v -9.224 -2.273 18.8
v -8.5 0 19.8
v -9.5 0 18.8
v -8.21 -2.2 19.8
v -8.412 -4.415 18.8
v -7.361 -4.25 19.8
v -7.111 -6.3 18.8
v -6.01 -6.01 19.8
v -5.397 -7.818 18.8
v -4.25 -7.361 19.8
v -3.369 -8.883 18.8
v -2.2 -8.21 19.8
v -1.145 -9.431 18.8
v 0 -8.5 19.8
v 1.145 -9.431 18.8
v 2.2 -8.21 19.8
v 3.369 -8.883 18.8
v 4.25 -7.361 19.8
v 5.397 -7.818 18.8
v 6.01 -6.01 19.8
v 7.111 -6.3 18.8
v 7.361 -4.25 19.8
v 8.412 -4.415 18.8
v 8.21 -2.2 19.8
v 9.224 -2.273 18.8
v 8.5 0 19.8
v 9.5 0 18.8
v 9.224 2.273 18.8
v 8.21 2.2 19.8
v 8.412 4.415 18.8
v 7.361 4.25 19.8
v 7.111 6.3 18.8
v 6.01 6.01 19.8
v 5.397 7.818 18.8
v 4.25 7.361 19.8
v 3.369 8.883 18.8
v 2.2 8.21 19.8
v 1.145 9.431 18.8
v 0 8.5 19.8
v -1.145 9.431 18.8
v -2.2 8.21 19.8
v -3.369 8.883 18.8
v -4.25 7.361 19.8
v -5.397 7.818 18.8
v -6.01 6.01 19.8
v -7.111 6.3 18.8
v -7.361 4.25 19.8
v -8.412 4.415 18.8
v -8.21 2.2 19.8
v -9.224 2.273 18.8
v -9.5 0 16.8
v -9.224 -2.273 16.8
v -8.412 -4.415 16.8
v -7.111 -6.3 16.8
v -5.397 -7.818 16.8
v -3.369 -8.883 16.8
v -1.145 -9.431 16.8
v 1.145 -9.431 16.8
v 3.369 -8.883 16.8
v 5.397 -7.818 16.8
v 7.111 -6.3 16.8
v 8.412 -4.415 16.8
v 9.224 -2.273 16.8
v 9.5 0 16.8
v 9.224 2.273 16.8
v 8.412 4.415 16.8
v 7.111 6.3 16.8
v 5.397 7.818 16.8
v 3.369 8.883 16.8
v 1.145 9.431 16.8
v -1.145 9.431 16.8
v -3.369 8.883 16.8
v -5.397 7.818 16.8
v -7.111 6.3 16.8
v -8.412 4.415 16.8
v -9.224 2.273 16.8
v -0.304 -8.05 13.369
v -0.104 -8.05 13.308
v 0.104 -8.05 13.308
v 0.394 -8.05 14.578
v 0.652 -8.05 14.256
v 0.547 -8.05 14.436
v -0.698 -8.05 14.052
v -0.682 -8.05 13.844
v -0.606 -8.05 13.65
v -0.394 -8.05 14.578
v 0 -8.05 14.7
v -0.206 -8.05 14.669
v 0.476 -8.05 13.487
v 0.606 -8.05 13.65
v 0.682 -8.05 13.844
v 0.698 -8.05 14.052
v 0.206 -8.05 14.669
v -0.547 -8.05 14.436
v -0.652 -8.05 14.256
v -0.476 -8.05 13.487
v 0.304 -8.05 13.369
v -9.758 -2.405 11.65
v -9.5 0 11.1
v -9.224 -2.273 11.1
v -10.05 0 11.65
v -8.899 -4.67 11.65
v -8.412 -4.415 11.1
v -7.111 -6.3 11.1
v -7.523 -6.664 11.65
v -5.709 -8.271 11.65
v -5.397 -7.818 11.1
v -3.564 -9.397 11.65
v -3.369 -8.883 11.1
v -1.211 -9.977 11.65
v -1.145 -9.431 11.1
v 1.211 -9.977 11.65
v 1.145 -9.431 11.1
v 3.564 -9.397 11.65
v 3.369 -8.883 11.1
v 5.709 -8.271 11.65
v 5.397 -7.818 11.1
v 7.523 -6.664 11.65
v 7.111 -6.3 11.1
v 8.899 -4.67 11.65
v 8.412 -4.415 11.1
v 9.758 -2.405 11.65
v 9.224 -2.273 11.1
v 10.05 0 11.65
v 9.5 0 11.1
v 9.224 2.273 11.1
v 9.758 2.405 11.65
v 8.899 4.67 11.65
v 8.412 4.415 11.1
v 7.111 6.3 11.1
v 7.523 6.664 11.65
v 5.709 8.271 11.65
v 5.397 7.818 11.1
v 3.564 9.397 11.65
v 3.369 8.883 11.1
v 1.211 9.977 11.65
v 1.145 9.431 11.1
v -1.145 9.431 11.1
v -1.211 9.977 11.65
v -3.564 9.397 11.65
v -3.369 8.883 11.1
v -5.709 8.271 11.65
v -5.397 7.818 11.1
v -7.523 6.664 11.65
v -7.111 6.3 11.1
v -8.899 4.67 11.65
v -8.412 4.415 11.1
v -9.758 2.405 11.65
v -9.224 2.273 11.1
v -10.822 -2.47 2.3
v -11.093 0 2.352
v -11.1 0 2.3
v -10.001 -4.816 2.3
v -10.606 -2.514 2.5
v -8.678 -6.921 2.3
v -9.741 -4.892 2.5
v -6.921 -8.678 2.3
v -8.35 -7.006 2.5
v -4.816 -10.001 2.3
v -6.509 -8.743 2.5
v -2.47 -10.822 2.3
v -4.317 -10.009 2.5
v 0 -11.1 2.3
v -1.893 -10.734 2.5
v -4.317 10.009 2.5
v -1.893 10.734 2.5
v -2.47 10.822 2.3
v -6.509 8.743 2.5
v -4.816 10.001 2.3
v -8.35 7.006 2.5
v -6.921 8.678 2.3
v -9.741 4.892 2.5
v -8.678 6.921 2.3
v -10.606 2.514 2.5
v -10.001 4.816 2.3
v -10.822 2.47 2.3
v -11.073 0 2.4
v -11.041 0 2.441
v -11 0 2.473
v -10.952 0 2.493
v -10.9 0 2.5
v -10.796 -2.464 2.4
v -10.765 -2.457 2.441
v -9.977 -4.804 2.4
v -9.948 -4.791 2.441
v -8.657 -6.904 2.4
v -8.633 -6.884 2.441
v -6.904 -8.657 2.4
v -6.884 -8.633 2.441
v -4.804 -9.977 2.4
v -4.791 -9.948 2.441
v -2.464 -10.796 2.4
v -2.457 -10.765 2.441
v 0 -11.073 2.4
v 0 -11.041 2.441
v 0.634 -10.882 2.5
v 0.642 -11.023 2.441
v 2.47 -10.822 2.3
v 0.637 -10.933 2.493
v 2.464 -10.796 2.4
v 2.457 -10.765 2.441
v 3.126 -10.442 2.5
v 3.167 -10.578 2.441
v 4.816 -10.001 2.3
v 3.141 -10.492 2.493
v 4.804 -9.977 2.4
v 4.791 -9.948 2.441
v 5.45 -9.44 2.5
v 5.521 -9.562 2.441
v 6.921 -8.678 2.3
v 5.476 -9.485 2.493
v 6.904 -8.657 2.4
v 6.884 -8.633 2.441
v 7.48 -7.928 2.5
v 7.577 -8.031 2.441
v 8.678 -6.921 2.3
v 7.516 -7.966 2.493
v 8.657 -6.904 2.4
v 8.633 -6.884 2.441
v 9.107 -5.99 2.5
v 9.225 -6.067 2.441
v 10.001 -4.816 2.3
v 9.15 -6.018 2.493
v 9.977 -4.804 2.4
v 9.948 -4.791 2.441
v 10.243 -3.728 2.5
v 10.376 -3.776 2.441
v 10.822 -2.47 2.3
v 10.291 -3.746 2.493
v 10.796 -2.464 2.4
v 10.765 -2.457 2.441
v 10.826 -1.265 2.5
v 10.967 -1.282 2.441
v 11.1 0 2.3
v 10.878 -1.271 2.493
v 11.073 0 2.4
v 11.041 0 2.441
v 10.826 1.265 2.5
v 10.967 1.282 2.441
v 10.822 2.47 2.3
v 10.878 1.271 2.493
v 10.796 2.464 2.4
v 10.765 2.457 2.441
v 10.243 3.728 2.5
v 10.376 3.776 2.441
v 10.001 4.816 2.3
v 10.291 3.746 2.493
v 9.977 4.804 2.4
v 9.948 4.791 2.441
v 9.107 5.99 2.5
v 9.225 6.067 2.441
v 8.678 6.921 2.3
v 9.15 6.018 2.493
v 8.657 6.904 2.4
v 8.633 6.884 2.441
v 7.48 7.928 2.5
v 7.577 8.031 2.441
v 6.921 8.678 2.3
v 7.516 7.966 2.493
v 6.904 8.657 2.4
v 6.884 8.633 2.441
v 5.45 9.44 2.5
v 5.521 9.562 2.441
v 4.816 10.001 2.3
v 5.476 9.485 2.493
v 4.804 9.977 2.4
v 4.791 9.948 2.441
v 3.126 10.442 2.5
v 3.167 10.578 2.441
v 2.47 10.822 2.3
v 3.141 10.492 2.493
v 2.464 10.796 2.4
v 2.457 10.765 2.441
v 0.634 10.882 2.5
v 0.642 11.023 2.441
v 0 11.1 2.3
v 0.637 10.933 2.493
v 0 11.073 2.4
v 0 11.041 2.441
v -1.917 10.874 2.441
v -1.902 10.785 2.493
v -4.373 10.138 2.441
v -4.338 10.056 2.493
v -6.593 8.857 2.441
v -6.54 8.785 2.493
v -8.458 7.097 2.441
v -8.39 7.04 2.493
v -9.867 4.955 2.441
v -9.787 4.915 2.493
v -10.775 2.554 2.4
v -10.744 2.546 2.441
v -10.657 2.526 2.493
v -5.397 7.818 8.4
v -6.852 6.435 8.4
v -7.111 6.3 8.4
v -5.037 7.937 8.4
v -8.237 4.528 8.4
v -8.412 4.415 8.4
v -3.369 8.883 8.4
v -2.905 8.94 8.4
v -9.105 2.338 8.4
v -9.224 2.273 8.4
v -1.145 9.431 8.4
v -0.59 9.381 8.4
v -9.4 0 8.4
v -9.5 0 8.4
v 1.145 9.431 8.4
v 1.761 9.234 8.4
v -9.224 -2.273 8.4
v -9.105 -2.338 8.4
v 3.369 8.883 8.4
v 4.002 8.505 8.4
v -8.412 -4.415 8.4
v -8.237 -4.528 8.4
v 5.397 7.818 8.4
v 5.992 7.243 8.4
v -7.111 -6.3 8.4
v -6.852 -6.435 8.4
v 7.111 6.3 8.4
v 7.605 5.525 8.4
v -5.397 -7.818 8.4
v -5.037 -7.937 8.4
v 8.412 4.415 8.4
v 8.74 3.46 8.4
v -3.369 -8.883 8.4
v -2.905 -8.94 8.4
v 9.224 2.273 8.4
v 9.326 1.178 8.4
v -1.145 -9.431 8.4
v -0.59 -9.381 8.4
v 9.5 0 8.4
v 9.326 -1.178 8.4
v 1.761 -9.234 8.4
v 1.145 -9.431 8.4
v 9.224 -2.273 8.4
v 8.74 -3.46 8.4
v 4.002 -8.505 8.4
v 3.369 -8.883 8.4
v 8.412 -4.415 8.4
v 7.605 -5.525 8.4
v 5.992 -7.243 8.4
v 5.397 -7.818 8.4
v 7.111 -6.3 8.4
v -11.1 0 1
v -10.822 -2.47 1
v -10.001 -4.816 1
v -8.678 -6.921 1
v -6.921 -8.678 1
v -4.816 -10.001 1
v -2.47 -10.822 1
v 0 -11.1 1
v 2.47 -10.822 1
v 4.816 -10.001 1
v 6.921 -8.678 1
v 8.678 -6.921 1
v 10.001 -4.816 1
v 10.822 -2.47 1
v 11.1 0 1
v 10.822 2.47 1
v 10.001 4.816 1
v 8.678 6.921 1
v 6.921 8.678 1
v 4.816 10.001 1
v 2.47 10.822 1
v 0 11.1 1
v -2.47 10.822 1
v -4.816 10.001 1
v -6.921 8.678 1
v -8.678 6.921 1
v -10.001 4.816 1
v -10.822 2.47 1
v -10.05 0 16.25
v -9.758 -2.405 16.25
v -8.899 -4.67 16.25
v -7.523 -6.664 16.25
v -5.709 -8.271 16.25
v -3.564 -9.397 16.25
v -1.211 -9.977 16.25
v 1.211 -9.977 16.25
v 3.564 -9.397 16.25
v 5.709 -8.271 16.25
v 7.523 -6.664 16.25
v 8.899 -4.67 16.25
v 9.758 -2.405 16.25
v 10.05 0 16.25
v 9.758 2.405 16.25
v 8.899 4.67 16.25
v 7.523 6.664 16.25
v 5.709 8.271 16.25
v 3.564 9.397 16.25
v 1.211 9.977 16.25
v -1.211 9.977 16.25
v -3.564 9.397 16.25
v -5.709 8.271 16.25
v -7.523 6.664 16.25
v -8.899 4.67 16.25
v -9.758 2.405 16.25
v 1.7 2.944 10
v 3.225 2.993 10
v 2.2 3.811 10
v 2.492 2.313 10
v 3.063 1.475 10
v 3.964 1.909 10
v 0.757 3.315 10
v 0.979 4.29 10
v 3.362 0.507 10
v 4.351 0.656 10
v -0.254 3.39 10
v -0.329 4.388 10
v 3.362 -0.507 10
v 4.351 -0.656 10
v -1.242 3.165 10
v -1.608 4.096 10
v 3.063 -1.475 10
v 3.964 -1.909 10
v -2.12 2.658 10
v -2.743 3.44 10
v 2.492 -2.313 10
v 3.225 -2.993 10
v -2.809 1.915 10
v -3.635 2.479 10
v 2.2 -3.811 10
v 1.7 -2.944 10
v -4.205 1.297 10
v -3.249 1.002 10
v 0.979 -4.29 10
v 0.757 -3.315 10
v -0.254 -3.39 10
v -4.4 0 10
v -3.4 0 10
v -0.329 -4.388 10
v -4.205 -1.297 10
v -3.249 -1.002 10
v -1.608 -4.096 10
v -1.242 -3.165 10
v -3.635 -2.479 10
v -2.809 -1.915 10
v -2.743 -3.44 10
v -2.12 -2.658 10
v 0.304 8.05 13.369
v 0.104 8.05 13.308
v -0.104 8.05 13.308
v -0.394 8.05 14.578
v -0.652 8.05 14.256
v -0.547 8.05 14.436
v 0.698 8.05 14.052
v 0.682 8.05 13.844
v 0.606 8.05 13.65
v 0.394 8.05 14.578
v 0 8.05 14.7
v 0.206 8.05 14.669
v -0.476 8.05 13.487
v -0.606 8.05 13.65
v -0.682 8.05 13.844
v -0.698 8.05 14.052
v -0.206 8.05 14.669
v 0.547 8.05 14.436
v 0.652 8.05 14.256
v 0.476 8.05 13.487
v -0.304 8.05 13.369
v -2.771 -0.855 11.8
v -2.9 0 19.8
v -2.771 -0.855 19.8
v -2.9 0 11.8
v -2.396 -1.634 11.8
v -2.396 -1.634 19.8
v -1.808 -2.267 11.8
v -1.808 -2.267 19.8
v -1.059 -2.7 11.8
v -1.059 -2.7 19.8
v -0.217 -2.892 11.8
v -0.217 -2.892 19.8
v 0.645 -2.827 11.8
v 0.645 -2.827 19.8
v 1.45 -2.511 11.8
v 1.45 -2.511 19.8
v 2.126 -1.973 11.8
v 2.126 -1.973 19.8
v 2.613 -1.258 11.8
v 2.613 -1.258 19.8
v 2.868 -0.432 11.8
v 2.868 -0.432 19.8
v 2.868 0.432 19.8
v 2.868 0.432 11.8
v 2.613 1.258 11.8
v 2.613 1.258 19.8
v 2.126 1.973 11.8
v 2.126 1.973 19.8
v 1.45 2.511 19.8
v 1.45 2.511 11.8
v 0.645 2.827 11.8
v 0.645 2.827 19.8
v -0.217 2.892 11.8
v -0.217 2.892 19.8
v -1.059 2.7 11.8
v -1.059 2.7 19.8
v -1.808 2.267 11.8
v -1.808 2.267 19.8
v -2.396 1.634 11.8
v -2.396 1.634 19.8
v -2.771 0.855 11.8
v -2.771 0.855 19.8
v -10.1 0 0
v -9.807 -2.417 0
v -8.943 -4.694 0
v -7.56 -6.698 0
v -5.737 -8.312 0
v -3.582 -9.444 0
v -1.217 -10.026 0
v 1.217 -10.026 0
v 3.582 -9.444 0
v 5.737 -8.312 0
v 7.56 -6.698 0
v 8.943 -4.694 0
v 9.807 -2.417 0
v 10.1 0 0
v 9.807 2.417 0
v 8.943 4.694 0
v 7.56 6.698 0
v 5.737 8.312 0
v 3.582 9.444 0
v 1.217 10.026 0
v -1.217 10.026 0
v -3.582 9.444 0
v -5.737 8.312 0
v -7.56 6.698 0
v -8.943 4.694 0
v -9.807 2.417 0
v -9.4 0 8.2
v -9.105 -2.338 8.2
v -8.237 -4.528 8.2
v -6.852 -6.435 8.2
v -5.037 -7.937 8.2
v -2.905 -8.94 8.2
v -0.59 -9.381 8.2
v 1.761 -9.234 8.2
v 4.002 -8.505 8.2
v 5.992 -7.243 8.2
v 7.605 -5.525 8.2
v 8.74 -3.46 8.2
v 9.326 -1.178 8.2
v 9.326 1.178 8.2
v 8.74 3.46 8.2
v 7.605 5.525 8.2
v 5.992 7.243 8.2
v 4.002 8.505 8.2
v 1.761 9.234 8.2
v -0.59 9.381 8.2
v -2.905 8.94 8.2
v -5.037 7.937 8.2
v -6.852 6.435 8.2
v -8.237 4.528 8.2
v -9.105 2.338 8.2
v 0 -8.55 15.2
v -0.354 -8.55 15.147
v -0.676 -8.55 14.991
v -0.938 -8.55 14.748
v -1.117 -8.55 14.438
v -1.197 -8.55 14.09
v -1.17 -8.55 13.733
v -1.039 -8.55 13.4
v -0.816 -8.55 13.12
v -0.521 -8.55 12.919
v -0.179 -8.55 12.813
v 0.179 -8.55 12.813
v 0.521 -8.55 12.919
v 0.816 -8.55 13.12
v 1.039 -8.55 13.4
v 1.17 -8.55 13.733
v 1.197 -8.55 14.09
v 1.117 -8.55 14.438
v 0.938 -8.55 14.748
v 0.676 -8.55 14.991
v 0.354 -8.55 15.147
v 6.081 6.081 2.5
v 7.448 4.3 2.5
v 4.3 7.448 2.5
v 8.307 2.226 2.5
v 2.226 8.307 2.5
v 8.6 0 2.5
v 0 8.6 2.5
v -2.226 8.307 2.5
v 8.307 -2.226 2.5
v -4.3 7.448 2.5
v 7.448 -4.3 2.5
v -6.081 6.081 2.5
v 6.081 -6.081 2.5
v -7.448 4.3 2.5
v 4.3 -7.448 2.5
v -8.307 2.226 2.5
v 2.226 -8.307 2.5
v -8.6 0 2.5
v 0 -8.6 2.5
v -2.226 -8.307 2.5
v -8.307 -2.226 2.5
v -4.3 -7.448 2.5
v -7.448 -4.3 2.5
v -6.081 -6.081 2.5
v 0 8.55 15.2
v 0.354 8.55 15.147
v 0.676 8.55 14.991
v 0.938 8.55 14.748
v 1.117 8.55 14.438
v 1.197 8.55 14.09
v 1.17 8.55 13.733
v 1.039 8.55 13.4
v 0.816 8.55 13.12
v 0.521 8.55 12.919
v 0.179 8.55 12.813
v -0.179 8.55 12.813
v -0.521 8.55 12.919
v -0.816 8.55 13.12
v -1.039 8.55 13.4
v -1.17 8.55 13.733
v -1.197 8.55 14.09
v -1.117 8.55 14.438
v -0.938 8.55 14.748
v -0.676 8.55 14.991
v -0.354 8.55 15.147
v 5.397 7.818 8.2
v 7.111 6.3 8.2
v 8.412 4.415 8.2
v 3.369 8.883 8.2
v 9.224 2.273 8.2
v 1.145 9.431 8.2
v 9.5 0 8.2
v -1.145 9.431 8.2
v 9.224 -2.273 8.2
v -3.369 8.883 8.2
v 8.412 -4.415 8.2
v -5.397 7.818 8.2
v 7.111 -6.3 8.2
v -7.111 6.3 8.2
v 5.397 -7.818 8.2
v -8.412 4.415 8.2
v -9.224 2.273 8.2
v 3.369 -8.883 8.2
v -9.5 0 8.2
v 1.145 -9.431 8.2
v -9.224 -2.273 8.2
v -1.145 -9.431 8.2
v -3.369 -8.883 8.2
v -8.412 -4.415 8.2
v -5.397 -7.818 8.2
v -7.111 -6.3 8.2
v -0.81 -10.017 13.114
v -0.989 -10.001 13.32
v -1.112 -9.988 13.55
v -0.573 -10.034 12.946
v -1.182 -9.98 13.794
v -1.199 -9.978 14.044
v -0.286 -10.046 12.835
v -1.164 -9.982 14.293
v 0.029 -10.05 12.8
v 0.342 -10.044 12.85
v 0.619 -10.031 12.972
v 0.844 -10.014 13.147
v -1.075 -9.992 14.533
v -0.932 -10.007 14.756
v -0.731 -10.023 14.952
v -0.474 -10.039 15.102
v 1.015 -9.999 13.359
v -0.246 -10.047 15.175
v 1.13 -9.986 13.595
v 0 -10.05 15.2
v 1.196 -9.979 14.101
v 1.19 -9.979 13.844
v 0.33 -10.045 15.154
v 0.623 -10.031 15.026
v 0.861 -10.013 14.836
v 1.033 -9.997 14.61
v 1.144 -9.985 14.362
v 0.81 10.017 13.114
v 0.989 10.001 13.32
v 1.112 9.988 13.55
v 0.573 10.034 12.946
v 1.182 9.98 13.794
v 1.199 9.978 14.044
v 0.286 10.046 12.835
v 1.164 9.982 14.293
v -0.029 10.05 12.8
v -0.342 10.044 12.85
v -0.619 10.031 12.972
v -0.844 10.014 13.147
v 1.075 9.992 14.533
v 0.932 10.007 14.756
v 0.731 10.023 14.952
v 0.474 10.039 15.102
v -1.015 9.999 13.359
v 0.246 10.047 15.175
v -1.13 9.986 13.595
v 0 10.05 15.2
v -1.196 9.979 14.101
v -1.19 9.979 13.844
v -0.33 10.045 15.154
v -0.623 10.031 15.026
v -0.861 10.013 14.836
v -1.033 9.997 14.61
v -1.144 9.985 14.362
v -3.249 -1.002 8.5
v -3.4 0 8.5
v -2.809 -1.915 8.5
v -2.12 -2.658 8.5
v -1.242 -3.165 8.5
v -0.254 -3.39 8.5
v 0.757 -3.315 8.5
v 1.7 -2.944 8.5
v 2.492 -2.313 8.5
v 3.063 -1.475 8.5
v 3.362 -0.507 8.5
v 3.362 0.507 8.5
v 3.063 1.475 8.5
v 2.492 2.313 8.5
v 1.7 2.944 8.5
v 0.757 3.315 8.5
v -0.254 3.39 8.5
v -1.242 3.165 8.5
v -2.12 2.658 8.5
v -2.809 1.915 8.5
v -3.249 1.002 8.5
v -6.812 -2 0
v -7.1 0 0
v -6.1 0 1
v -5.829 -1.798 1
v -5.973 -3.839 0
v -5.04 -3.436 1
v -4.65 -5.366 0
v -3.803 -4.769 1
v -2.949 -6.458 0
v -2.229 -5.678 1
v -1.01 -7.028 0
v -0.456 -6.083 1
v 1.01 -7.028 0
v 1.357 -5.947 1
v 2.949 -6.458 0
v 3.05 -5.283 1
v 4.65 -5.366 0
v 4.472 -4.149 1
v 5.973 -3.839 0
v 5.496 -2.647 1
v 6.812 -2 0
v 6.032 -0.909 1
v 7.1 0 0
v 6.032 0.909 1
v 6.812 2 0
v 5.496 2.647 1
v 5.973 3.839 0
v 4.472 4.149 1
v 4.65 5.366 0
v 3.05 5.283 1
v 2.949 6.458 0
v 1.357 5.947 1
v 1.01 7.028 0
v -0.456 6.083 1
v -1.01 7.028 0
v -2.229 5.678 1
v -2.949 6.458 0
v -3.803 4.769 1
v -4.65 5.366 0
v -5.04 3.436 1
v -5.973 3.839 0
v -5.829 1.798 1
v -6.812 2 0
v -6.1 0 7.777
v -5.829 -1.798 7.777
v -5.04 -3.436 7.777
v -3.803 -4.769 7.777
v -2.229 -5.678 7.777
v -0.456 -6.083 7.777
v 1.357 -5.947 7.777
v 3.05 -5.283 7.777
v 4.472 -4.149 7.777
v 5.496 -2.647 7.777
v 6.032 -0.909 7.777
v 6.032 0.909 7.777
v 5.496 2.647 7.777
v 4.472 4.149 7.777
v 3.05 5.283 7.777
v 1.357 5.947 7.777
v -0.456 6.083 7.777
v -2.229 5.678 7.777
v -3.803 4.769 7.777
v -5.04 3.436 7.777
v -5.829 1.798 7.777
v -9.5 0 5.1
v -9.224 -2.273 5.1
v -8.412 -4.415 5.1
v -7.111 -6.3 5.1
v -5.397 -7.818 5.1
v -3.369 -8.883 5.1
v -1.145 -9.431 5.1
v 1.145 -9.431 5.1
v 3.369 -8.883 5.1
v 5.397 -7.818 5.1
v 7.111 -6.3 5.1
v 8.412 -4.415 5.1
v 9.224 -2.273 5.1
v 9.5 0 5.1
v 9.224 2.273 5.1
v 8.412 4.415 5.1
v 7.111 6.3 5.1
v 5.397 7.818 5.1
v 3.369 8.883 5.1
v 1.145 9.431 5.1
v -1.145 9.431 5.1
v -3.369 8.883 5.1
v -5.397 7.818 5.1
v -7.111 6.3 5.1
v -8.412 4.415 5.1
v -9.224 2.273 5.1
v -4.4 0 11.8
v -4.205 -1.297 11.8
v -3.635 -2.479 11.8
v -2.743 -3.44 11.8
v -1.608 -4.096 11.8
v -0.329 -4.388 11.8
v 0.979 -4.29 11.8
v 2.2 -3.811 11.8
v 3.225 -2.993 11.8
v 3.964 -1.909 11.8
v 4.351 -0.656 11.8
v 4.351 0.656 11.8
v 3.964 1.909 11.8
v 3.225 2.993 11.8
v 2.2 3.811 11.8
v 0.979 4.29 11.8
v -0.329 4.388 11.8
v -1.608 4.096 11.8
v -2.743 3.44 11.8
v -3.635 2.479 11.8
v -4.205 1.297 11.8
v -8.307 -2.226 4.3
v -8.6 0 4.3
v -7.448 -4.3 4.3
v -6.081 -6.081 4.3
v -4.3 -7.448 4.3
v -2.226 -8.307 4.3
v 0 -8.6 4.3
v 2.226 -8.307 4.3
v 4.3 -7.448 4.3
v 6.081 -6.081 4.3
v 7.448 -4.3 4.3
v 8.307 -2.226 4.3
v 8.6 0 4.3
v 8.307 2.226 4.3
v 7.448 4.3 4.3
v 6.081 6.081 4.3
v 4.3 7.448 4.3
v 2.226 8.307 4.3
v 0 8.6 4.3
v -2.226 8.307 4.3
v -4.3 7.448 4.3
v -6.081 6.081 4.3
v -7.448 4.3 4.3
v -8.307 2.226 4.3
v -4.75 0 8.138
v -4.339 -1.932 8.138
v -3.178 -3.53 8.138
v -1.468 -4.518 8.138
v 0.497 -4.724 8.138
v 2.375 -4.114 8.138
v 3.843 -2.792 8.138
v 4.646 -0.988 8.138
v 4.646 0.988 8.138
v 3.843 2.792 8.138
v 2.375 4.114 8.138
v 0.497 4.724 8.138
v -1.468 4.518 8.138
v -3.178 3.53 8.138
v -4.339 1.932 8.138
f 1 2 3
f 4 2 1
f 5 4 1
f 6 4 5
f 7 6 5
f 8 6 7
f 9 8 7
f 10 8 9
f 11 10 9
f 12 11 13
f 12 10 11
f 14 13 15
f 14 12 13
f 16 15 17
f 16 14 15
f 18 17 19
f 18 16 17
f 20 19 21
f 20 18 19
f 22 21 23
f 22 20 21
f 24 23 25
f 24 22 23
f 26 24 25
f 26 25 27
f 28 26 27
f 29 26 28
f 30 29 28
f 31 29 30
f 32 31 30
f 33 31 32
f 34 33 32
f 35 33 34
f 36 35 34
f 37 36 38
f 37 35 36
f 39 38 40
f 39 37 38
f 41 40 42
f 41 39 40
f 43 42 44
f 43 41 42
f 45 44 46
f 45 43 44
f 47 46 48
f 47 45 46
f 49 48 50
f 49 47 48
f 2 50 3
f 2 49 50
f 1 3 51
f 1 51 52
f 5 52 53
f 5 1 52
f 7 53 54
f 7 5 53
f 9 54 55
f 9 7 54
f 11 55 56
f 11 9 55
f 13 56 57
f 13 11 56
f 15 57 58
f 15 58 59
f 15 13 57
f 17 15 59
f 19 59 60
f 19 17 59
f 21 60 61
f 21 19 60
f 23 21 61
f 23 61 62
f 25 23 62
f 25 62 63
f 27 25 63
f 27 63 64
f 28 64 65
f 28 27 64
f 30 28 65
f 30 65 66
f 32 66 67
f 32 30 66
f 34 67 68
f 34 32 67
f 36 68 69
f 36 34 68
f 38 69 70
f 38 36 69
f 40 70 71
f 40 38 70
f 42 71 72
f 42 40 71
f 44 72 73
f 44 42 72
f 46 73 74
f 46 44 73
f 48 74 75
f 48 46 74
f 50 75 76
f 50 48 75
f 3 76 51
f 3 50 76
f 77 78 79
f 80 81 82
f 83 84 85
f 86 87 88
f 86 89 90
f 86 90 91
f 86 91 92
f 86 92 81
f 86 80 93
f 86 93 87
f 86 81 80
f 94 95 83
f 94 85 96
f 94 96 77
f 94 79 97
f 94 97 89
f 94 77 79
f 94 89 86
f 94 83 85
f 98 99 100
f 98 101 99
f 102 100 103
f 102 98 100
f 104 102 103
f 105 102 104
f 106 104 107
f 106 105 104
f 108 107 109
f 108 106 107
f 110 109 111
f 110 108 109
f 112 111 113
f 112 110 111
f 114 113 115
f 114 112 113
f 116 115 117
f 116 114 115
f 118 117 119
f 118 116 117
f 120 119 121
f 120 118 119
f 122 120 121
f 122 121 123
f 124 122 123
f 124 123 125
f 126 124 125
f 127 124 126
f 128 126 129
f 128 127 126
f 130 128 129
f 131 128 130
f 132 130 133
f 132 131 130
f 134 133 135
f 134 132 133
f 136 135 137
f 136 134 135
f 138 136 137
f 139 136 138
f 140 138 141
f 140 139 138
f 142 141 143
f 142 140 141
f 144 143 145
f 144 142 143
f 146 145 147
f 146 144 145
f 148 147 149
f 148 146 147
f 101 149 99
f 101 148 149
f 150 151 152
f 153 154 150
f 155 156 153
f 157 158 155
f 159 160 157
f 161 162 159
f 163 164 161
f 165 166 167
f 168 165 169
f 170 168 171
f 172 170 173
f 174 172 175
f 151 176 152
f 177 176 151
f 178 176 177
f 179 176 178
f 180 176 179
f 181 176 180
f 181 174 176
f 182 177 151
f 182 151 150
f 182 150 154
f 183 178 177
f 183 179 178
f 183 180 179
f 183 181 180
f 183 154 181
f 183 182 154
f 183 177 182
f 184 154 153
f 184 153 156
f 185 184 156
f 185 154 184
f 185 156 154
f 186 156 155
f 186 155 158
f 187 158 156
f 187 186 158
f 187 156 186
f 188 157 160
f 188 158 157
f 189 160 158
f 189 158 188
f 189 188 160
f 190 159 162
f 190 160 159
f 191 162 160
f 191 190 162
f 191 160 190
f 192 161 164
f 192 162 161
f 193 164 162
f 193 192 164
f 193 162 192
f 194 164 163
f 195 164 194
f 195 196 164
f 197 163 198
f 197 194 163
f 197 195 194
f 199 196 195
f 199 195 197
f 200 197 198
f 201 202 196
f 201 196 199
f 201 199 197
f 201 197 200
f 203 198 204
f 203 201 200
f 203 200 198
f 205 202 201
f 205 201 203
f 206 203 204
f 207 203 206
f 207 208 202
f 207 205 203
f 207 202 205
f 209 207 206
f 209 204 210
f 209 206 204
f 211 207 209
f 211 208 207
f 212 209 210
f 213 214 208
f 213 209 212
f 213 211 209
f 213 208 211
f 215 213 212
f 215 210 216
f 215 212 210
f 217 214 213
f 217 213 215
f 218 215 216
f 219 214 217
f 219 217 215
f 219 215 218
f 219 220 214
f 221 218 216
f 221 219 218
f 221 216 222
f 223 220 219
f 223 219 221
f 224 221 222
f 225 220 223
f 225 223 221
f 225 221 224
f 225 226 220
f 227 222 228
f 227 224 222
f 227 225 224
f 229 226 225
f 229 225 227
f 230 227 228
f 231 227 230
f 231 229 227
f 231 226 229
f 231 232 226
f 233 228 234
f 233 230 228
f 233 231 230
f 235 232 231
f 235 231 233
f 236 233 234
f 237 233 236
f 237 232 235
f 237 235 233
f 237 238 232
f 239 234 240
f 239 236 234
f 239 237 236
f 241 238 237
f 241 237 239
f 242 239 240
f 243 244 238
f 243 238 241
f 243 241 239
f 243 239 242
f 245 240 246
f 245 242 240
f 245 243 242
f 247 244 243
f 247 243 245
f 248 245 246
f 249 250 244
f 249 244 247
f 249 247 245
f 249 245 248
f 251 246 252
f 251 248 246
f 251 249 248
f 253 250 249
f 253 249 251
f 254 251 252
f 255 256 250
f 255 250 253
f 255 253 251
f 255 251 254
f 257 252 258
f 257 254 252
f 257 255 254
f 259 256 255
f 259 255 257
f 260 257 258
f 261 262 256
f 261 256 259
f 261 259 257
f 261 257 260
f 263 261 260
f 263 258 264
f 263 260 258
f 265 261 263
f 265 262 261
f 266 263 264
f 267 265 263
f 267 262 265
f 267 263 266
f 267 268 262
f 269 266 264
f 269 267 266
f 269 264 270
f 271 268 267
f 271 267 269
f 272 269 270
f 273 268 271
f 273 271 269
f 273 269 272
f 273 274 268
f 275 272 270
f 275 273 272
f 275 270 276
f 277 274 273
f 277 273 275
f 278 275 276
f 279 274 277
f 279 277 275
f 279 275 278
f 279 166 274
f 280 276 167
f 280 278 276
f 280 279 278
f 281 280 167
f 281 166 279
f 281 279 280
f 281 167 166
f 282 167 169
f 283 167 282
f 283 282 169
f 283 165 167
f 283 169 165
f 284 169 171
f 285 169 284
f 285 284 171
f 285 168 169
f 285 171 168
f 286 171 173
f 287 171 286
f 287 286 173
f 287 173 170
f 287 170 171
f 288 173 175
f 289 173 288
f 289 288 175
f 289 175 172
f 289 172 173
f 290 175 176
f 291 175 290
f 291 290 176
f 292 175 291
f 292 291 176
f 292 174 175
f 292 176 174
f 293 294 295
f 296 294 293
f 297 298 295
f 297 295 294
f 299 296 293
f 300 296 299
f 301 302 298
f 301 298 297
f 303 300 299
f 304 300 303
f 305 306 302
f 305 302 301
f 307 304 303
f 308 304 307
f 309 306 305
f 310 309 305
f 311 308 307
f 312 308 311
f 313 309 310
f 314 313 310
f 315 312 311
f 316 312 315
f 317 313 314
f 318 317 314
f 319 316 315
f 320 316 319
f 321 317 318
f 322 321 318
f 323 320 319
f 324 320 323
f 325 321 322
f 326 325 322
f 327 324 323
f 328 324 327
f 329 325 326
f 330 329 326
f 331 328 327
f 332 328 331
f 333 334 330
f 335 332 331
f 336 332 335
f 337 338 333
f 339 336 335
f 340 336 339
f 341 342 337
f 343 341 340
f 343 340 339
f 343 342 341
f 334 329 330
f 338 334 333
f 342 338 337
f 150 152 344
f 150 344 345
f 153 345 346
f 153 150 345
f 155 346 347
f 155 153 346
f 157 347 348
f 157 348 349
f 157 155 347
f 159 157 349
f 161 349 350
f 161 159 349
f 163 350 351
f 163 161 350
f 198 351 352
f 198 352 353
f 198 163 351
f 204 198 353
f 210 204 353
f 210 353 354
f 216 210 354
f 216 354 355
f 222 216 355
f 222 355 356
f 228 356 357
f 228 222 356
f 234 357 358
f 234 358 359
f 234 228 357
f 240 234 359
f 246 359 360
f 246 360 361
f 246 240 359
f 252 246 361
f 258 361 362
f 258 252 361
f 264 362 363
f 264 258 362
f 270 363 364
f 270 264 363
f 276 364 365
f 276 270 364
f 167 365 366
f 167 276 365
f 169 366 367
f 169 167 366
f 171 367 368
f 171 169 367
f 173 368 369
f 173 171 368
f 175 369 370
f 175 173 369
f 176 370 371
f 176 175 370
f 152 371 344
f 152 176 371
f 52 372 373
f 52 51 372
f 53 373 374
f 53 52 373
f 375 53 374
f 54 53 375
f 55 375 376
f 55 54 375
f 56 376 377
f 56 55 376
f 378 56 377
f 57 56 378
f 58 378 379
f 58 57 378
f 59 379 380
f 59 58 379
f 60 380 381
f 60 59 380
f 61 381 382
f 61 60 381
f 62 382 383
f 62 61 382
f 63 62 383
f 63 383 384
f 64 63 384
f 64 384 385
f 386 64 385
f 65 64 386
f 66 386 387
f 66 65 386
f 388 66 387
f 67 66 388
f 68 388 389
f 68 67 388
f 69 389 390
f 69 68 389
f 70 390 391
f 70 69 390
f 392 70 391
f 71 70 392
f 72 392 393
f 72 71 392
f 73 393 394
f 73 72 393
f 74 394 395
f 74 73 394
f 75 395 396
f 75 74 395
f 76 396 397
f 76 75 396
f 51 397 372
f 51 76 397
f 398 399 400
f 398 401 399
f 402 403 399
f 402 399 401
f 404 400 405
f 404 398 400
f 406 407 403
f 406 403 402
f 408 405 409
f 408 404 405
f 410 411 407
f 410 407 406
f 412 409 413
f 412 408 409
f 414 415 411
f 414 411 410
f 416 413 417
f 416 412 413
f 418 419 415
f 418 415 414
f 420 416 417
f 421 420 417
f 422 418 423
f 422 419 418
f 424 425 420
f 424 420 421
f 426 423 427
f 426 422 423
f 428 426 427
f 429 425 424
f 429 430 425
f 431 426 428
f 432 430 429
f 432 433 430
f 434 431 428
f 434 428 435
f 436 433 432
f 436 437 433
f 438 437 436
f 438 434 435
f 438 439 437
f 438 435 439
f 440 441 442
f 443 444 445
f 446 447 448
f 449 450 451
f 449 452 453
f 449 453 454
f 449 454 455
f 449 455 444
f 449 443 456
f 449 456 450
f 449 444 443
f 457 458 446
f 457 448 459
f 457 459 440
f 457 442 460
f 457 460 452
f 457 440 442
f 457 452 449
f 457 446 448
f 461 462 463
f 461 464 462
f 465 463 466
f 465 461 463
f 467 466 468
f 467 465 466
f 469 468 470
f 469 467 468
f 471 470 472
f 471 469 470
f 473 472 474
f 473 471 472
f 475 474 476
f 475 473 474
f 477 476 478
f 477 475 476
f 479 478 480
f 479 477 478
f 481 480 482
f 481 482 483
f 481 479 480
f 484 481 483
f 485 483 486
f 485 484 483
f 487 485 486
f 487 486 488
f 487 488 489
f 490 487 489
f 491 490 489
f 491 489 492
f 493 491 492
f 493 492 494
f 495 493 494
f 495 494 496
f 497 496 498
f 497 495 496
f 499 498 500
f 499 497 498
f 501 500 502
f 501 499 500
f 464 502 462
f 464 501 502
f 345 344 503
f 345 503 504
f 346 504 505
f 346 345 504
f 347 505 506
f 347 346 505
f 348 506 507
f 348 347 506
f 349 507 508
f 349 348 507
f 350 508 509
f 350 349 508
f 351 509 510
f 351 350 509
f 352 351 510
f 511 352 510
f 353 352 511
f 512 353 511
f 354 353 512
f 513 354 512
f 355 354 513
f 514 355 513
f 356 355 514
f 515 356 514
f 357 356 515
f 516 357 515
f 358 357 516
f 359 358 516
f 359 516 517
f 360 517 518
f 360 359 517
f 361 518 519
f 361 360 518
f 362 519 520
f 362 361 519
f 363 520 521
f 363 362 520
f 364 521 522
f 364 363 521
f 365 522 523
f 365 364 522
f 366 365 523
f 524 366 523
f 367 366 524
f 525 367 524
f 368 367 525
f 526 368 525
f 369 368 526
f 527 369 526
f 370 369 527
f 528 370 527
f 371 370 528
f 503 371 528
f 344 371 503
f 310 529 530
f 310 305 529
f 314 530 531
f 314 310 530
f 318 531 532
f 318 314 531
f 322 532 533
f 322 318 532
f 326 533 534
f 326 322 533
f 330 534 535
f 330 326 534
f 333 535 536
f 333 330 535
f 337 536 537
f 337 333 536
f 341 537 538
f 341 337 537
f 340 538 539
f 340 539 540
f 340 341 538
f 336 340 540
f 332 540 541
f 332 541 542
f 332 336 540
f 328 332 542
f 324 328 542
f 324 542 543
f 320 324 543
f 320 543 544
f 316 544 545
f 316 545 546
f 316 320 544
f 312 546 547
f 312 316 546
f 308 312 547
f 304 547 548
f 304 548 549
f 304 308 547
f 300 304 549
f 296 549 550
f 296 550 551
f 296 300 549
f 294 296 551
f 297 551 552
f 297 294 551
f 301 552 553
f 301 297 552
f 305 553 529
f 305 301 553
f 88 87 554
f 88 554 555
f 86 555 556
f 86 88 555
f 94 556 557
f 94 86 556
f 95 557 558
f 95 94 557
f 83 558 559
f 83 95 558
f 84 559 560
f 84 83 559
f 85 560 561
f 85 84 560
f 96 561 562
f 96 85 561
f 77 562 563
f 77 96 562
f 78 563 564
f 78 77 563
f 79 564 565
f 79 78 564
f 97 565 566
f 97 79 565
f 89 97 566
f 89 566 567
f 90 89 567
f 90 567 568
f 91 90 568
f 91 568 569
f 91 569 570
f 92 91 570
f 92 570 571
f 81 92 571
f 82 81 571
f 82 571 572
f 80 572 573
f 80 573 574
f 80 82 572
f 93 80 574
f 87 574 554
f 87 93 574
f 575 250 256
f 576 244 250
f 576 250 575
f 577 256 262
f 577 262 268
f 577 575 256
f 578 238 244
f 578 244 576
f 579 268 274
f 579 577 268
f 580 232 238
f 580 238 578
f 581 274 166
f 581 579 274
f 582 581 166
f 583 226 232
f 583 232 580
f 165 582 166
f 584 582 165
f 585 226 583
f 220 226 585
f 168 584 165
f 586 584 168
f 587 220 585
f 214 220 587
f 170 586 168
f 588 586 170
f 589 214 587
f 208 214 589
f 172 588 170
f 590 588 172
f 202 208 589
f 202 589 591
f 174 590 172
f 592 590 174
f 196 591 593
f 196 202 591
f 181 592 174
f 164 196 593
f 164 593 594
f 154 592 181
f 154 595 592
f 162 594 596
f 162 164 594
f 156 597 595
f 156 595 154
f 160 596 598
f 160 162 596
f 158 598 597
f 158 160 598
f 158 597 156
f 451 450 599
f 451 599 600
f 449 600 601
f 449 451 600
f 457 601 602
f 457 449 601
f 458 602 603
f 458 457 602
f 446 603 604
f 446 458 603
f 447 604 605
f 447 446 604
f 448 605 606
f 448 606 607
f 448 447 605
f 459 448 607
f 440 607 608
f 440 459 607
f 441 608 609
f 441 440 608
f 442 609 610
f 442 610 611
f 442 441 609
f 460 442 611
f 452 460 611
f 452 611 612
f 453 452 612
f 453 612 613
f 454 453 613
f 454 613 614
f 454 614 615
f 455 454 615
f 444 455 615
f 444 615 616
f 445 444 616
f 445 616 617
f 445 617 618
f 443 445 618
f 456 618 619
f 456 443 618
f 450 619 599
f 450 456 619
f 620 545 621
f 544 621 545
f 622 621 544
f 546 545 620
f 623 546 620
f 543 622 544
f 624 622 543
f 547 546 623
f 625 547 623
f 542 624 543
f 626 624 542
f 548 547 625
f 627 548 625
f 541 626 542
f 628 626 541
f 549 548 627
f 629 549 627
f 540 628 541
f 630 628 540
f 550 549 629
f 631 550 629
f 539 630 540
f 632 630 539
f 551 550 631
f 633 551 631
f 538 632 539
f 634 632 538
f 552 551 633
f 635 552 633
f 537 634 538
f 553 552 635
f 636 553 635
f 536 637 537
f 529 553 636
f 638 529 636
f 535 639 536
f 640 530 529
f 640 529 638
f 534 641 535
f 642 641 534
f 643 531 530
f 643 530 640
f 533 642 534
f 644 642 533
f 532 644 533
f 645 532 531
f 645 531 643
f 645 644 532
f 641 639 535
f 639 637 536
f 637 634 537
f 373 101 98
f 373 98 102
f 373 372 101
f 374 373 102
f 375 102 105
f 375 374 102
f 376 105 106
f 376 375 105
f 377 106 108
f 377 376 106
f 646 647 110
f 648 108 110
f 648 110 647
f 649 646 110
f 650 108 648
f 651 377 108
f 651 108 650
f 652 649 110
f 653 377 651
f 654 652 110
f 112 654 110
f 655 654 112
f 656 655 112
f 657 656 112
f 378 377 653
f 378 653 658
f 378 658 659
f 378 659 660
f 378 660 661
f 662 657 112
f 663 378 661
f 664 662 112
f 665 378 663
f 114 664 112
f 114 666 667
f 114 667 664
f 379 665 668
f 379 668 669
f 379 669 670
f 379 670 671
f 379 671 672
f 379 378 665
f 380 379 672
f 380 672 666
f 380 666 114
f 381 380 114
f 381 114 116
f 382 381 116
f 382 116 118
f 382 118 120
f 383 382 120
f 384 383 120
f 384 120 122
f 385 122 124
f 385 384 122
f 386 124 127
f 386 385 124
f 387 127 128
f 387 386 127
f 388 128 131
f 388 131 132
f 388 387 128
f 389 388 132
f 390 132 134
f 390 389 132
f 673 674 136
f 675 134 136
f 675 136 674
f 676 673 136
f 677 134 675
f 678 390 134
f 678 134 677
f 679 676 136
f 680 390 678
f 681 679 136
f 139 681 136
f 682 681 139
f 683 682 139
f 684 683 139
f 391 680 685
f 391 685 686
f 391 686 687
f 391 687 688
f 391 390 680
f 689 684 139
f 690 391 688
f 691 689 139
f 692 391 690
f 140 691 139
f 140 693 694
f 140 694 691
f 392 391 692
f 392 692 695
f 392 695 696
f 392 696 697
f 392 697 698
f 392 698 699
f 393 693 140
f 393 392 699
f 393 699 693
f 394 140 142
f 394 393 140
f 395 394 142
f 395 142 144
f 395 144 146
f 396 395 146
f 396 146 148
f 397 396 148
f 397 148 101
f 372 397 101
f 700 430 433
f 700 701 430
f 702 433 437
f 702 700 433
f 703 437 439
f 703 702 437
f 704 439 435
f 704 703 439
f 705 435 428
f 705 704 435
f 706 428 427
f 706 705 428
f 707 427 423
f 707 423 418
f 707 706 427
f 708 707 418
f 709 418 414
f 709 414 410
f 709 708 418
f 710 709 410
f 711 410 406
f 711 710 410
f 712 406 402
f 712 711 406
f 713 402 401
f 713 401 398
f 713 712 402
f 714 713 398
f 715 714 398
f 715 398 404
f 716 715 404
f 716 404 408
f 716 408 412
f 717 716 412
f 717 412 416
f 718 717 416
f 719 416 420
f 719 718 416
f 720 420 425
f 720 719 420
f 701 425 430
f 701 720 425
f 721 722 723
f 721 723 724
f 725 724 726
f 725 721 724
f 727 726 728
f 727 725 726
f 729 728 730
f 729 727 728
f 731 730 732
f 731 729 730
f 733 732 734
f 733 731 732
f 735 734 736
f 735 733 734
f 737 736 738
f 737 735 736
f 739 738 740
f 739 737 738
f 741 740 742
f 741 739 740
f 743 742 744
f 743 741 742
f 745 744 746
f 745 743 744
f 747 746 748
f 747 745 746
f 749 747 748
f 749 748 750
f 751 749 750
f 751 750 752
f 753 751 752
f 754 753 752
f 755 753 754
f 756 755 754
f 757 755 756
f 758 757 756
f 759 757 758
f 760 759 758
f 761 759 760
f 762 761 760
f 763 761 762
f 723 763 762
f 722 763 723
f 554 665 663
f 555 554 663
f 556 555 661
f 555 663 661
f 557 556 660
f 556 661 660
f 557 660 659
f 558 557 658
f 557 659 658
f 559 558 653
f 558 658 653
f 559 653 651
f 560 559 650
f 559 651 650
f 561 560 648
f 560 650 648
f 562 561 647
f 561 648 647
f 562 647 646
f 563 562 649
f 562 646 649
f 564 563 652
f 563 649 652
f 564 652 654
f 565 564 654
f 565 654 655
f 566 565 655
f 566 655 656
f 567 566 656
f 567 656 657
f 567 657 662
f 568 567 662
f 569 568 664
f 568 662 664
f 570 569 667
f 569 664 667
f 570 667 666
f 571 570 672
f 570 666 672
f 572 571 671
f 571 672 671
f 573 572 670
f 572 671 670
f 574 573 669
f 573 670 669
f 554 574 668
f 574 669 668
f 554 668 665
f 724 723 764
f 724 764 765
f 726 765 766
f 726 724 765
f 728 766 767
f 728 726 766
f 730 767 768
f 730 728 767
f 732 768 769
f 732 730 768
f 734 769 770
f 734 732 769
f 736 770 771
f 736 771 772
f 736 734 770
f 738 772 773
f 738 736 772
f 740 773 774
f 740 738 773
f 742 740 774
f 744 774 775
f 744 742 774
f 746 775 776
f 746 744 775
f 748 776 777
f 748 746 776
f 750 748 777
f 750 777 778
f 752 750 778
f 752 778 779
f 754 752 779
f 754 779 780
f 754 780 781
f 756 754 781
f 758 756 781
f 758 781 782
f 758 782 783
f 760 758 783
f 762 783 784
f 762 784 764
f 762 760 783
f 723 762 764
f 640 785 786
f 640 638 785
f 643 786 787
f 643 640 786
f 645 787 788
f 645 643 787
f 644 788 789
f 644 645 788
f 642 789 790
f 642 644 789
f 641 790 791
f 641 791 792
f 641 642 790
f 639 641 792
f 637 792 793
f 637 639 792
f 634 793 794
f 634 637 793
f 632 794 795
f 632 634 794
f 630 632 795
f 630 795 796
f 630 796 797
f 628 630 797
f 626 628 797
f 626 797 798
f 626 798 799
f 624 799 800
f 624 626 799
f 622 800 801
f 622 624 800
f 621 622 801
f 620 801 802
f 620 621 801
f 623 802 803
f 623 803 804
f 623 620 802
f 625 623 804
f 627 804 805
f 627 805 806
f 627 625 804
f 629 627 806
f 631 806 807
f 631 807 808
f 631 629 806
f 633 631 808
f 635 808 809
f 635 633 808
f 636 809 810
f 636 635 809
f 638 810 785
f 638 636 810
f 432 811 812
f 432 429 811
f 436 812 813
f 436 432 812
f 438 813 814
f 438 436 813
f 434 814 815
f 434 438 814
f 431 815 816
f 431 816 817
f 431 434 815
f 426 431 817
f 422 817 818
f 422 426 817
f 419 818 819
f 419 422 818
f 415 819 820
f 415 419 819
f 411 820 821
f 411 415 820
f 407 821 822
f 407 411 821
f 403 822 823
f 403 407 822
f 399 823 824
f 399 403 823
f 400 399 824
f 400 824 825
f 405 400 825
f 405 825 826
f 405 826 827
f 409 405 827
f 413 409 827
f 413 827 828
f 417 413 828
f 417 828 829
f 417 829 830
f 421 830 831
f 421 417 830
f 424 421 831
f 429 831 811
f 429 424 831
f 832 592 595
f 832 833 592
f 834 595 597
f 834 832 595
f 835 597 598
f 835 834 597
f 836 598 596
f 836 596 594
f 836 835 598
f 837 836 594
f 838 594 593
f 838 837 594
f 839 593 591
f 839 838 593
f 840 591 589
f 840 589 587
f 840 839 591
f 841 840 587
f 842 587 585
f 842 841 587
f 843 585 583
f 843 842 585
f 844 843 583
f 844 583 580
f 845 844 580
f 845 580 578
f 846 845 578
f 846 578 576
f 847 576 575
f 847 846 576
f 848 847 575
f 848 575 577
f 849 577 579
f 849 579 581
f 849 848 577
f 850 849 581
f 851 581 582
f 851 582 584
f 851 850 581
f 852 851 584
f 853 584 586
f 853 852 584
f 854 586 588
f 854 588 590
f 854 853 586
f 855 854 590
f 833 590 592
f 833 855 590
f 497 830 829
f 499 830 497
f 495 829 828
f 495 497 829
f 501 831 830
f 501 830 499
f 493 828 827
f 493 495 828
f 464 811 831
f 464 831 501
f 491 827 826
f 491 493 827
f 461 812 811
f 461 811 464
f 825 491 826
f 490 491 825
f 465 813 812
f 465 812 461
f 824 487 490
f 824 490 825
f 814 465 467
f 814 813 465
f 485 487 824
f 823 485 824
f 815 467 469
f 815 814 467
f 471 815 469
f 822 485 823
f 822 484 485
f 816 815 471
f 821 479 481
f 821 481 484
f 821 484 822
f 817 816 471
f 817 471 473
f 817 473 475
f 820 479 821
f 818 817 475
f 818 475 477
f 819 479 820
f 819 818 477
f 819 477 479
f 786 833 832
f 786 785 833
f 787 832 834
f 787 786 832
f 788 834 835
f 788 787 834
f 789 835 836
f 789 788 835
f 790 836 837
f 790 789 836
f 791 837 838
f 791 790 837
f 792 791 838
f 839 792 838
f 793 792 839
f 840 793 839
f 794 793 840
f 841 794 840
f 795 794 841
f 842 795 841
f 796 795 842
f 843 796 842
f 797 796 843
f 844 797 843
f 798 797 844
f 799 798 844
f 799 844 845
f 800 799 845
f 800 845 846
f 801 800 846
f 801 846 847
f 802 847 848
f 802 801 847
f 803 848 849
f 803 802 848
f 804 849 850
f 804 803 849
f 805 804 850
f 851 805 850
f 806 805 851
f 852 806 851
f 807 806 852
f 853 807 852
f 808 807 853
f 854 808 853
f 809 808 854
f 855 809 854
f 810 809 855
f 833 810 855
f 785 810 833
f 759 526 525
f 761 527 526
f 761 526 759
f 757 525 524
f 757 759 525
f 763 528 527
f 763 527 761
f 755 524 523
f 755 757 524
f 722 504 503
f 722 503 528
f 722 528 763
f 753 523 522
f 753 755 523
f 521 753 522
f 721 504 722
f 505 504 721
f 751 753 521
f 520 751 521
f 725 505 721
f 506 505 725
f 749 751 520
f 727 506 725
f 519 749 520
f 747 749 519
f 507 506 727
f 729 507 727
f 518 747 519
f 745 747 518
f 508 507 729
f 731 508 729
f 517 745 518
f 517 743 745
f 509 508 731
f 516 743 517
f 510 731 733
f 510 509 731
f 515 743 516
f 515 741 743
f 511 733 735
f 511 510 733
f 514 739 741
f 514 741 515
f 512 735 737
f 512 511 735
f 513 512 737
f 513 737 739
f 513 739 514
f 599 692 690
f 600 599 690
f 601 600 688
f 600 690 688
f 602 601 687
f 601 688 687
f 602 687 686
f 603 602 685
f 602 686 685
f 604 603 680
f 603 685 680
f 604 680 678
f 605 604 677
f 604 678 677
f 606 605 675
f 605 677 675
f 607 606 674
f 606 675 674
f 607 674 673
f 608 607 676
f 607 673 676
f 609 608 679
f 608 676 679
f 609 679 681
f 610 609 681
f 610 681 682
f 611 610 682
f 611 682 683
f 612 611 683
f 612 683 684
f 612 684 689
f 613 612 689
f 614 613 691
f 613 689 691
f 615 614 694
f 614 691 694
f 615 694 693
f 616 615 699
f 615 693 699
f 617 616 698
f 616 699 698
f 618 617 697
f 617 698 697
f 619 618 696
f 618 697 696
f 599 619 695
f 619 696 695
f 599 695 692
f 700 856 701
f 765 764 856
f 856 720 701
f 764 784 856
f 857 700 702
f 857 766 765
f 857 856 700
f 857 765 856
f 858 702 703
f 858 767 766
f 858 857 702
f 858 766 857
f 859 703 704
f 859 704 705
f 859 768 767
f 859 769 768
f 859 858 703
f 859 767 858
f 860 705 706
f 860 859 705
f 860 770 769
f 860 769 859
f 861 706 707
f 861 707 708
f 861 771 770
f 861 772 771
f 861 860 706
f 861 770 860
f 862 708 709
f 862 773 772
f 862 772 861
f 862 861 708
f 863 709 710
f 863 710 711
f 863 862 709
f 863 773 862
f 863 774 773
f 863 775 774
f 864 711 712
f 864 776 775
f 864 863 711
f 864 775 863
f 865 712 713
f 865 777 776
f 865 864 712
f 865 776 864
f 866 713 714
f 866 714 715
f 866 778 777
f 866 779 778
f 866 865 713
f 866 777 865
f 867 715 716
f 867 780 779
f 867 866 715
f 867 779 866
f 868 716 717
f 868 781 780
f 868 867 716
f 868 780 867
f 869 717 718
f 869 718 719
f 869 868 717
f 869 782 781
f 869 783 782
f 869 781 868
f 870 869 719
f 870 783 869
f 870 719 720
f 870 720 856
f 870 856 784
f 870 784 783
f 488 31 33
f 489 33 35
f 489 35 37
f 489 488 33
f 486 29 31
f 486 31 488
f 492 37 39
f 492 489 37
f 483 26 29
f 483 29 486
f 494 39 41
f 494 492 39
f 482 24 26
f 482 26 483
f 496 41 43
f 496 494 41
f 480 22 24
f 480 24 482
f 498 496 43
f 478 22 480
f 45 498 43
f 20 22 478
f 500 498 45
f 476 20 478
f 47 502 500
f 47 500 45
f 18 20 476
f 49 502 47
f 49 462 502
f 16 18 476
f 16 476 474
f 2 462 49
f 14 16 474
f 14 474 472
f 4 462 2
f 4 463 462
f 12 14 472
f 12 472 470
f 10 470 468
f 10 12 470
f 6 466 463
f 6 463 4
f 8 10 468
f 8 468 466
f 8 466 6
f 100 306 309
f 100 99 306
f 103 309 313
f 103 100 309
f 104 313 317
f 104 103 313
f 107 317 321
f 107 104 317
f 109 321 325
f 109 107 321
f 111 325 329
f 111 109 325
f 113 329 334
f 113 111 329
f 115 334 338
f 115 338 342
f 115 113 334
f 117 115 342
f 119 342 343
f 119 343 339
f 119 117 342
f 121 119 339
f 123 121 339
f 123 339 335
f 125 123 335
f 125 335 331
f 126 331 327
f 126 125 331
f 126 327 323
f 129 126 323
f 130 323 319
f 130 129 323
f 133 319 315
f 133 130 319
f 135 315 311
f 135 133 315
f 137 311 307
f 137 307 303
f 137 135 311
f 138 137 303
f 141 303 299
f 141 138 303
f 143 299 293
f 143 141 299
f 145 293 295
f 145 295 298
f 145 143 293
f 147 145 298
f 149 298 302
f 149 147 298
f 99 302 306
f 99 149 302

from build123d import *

# Parameters (mm, degrees)
CHAMFER_1_SIZE                       = 1
CHAMFER_2_SIZE                       = 1
FILLET_1_R                           = 0.2
SKETCH_5_R                           = 1.2
CUT_EXTRUDE_2_DEPTH                  = 2
CHAMFER_3_SIZE                       = 0.5
PATTERN_CIRCULAR_1_COUNT             = 2
CHAMFER_3_OF_PATTERN_CIRCULAR_1_SIZE = 0.5


with BuildPart() as part:
    # 스케치3 → 회전2 (revolve)
    with BuildSketch(Plane(origin=(0, 0, 0), x_dir=(1, 0, 0), z_dir=(0, 1, 0)), mode=Mode.PRIVATE) as revolve_2_sk:
        Polygon((11.1, 0), (11.1, -2.5), (8.6, -2.5), (8.6, -4.3), (9.5, -5.1), (9.5, -8.2), (9.4, -8.2), (9.4, -8.4), (9.5, -8.4), (9.5, -11.1), (10.05, -11.65), (10.05, -16.25), (9.5, -16.8), (9.5, -19.8), (2.9, -19.8), (2.9, -11.8), (4.4, -11.8), (4.4, -10), (3.4, -10), (3.4, -8.5), (6.1, -7.77653718), (6.1, 0), align=None)
    revolve(revolve_2_sk.sketch.rotate(Axis((0, 0, 0), (0, 0, 1)), 180), axis=Axis((0, 0, 0), (0, 0, 1)))

    # 모따기1
    chamfer_1_edges = [part.edges().sort_by_distance(p)[0] for p in [
        (6.1, 0, 0),
        (9.5, 0, 19.8),
    ]]
    chamfer(chamfer_1_edges, length=CHAMFER_1_SIZE)

    # 모따기2
    chamfer_2_edges = [part.edges().sort_by_distance(p)[0] for p in [
        (11.1, 0, 0),
    ]]
    chamfer(chamfer_2_edges, length=CHAMFER_2_SIZE)

    # 필렛1
    fillet_1_edges = [part.edges().sort_by_distance(p)[0] for p in [
        (11.1, 0, 2.5),
    ]]
    fillet(fillet_1_edges, radius=FILLET_1_R)

    # 스케치5 → 컷-돌출2 (cut)
    with BuildSketch(Plane(origin=(0, 10.05, 0), x_dir=(1, 0, 0), z_dir=(0, 1, 0))):
        with Locations(Location((0, -14, 0), (0, 0, 270))):
            Circle(SKETCH_5_R)
    cut_extrude_2 = extrude(amount=-CUT_EXTRUDE_2_DEPTH, mode=Mode.SUBTRACT)

    # 모따기3
    chamfer_3_edges = [part.edges().sort_by_distance(p)[0] for p in [
        (0, 8.05, 12.8),
    ]]
    chamfer(chamfer_3_edges, length=CHAMFER_3_SIZE)

    # 원형 패턴1: 컷-돌출2 ×2 about axis
    pattern_circular_1_axis = Axis((0, 0, 0), (0, 0, -1))
    for i in range(1, PATTERN_CIRCULAR_1_COUNT):
        add(cut_extrude_2.rotate(pattern_circular_1_axis, i * 360 / PATTERN_CIRCULAR_1_COUNT), mode=Mode.SUBTRACT)

    # 모따기3 of 원형 패턴1
    chamfer_3_of_pattern_circular_1_edges = [part.edges().sort_by_distance(p)[0] for p in [
        (0, -8.05, 12.8),
    ]]
    chamfer(chamfer_3_of_pattern_circular_1_edges, length=CHAMFER_3_OF_PATTERN_CIRCULAR_1_SIZE)


solid = part.part
